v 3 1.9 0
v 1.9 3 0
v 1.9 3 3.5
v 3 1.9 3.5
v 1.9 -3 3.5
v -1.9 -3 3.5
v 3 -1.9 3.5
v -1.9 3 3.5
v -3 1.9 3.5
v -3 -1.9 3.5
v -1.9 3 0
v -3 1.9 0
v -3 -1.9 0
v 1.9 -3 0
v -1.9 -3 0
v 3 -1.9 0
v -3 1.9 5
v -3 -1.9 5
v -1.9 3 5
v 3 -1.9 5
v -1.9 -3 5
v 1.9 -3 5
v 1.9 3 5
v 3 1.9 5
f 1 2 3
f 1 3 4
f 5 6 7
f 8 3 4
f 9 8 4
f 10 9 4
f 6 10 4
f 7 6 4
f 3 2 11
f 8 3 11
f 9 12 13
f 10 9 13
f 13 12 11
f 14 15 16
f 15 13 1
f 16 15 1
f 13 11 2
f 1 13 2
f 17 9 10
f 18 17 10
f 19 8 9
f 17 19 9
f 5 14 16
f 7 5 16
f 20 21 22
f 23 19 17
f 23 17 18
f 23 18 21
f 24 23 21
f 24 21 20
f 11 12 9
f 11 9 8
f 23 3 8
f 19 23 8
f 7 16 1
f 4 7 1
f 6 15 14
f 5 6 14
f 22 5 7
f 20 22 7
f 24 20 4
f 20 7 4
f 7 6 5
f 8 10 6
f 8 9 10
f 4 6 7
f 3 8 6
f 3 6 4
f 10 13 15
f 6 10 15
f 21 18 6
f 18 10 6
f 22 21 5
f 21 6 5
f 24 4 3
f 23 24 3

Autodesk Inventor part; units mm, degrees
ref_plane "YZ Plane" through (0, 0, 0) normal (1, 0, 0) x (0, 1, 0)
ref_plane "XZ Plane" through (0, 0, 0) normal (0, 1, 0) x (-1, 0, 0)
ref_plane "XY Plane" through (0, 0, 0) normal (0, 0, 1) x (1, 0, 0)
sketch "Эскиз1" plane through (0, 0, 0) normal (0, 0, 1) x (1, 0, 0)
  line L0 (-3, -3) -> (3, -3)
  line L1 (3, -3) -> (3, 3)
  line L2 (3, 3) -> (-3, 3)
  line L3 (-3, 3) -> (-3, -3)
  line L4 (-3, -3) -> (3, 3) construction
  line L5 (3, -3) -> (-3, 3) construction
  line L6 (-3, 1.9) -> (-1.9, 3)
  line L7 (1.9, 3) -> (3, 1.9)
  line L8 (-3, -1.9) -> (-1.9, -3)
  line L9 (1.9, -3) -> (3, -1.9)
  point P0 (0, 0)
  dimension "d0" = 6
  dimension "d1" = 6
  dimension "d6" = 3.8
  dimension "d7" = 3.8
extrude "Выдавливание1" add sketch "Эскиз1" along normal blind 3.5 contours L8 L3 L6 L2 L7 L1 L9 L0
sketch "Эскиз2" plane through (0, 0, 3.5) normal (0, 0, 1) x (1, 0, 0)
  line L0 (3, -1.9) -> (3, 1.9) projected
  line L1 (1.9, 3) -> (-1.9, 3) projected
  line L2 (-3, 1.9) -> (-3, -1.9) projected
  line L3 (-1.9, -3) -> (1.9, -3) projected
  line L4 (3, 1.9) -> (1.9, 3) projected
  line L5 (-1.9, 3) -> (-3, 1.9) projected
  line L6 (-3, -1.9) -> (-1.9, -3) projected
  line L7 (1.9, -3) -> (3, -1.9) projected
  point P0 (0, 0)
extrude "Выдавливание2" add sketch "Эскиз2" along normal blind 1.5 separate body
properties part number "Кнопка маленькая"
